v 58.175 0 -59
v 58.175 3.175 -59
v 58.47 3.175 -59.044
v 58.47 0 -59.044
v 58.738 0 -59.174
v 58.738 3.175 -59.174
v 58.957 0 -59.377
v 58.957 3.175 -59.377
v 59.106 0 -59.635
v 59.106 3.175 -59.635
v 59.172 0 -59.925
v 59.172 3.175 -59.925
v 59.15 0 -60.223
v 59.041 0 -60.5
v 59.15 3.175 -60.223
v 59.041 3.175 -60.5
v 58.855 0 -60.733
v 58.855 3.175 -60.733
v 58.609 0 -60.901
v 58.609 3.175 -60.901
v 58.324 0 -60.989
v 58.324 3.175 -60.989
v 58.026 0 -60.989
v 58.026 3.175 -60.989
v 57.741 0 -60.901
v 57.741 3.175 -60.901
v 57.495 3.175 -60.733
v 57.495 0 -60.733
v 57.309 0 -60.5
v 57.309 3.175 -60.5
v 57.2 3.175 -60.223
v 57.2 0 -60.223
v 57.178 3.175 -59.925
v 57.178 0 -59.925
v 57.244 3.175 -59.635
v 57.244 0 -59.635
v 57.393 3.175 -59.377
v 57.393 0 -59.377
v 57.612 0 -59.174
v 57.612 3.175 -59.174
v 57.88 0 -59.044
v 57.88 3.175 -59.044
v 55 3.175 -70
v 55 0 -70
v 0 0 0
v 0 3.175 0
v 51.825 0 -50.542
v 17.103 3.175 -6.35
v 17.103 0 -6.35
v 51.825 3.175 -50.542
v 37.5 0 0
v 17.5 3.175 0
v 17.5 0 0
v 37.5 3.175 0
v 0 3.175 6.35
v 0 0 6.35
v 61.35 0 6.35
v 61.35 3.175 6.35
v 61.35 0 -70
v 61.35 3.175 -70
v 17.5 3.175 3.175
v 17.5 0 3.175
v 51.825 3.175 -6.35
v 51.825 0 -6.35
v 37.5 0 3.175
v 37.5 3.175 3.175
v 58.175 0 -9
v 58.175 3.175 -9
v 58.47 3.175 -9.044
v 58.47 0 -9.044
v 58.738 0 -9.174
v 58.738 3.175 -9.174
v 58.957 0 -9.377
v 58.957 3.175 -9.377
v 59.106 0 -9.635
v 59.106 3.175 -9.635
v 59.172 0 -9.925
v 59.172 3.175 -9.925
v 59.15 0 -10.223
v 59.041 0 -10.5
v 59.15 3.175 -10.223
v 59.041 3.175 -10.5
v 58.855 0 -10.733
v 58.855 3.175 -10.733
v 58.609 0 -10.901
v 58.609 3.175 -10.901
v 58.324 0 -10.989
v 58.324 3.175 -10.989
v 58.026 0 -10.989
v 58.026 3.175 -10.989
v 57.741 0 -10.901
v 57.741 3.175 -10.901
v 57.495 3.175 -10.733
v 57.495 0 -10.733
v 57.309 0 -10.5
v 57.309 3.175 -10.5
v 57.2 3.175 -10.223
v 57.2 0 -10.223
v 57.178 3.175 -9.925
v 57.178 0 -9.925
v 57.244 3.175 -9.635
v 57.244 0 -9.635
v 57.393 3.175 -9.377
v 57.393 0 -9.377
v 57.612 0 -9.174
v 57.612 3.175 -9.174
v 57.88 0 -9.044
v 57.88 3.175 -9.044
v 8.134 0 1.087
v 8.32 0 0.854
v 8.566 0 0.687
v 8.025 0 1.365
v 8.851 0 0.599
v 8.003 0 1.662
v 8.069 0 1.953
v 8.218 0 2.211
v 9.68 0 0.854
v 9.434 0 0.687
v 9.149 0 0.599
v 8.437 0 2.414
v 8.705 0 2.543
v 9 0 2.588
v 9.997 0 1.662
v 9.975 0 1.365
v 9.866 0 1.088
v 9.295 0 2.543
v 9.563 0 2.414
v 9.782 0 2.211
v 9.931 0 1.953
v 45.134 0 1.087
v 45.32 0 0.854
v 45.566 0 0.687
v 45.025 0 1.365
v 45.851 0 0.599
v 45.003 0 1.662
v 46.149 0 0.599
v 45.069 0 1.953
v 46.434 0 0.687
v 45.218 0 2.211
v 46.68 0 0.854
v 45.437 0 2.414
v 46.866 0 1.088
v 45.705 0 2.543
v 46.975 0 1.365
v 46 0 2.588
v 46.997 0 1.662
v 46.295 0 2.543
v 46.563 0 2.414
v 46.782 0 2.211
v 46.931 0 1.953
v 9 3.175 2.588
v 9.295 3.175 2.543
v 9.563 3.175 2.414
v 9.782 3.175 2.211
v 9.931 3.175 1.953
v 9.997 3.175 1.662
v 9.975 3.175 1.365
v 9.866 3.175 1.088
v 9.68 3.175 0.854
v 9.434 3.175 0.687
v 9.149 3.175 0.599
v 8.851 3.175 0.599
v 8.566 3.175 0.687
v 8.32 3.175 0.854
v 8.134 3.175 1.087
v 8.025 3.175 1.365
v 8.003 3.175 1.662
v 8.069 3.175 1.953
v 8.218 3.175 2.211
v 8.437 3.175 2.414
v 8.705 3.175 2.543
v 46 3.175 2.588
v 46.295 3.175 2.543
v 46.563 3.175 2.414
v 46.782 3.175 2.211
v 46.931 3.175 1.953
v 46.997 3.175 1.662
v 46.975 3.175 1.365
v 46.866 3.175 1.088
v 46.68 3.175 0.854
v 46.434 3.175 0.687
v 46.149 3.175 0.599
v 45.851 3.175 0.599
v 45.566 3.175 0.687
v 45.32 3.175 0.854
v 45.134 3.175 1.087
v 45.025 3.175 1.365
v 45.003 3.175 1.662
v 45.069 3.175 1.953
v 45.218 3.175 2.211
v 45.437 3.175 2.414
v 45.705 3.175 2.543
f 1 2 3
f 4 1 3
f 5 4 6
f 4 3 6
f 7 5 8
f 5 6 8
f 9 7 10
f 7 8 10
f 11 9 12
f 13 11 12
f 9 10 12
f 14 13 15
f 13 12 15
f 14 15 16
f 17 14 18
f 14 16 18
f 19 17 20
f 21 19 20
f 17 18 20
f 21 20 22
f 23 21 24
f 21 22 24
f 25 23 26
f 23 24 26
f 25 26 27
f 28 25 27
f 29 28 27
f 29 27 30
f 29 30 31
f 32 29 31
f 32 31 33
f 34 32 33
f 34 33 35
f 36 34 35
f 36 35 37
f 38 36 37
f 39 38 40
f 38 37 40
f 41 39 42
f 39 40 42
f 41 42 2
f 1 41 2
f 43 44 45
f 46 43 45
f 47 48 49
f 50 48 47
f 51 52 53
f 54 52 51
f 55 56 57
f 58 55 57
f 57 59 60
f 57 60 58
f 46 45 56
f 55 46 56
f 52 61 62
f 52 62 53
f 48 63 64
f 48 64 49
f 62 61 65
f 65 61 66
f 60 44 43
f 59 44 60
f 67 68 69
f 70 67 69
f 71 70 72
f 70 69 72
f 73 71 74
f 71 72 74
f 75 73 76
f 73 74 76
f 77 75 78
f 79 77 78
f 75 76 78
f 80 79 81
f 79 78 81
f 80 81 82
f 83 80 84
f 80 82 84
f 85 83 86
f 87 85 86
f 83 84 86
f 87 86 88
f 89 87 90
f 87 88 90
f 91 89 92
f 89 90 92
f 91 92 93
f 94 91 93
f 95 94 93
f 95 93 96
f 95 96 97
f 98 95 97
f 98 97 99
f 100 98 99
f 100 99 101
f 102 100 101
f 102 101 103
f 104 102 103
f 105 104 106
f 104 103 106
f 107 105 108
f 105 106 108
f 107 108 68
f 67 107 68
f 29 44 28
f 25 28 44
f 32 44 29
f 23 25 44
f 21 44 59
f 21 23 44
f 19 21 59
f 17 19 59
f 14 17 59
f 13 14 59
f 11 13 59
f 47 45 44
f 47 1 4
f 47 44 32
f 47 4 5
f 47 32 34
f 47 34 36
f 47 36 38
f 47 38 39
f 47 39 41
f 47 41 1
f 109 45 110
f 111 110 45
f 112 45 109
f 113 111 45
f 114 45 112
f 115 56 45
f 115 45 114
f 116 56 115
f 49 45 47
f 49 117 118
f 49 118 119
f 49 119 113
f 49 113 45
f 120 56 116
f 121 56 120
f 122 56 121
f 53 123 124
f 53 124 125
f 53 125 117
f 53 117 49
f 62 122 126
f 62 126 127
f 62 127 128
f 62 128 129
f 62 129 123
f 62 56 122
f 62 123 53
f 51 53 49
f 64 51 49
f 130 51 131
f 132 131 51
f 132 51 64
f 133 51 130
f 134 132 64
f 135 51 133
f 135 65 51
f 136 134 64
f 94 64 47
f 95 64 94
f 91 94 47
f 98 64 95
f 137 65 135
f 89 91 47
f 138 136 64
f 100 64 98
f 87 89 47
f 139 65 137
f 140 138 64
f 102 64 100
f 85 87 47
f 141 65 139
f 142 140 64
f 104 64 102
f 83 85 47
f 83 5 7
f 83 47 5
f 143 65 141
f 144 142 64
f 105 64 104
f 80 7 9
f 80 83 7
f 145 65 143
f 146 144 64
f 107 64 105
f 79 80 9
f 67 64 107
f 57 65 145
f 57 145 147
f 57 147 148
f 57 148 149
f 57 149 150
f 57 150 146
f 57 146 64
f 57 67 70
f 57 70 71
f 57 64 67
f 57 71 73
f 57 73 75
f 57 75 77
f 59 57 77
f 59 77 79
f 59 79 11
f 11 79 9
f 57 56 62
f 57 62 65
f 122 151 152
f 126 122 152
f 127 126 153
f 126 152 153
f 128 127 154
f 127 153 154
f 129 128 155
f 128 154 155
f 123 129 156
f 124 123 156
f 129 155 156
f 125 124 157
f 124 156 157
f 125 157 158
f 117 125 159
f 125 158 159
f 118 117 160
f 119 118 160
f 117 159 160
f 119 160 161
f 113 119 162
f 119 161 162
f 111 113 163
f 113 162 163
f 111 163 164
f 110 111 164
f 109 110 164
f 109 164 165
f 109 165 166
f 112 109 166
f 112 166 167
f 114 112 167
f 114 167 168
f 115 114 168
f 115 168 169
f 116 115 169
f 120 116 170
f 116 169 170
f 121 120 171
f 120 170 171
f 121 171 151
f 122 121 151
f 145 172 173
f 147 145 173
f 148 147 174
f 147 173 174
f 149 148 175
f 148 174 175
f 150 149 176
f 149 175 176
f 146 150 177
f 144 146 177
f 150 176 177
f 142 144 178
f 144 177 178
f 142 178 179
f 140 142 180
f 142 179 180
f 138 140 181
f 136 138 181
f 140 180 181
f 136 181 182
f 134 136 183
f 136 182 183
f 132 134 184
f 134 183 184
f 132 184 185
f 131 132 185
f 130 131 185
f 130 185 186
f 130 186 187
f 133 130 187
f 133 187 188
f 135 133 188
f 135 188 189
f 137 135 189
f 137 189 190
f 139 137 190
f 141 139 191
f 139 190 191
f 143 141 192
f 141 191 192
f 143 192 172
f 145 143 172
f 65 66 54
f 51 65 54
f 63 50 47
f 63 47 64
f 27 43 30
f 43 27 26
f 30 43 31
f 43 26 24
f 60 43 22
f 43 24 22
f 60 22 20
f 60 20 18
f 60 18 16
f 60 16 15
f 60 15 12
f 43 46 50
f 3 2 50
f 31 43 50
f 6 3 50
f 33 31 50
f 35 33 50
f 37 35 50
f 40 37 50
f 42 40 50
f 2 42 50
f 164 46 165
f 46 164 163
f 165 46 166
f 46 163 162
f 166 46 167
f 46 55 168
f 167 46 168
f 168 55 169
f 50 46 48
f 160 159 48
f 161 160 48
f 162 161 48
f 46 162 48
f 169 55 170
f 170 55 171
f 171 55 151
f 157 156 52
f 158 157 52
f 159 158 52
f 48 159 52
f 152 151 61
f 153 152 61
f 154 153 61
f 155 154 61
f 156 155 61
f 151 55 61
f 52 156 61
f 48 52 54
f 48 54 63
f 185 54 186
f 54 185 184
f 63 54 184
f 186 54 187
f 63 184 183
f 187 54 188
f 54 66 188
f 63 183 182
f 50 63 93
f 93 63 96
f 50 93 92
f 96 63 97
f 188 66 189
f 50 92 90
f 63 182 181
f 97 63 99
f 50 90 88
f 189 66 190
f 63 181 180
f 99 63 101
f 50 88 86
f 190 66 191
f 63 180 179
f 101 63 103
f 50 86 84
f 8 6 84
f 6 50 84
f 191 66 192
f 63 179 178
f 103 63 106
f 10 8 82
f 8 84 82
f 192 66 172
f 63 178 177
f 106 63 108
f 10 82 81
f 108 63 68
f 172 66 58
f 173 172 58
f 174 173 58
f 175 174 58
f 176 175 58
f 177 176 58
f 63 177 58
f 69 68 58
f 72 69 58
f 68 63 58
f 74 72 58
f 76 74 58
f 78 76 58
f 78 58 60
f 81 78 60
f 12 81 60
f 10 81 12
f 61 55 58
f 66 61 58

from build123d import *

# Parameters (mm, degrees)
BOSS_EXTRUDE1_DEPTH = 3.175
SKETCH3_W           = 55
SKETCH3_H           = 6.35
BOSS_EXTRUDE3_DEPTH = 3.175
SKETCH5_W           = 6.35
SKETCH5_H           = 76.35
BOSS_EXTRUDE4_DEPTH = 3.175
SKETCH2_R           = 1
SKETCH2_W           = 20
SKETCH2_H           = 3.175
CUT_EXTRUDE1_DEPTH  = 3.175
CUT_EXTRUDE2_DEPTH  = 3.175


with BuildPart() as part:
    # Sketch1 → Boss-Extrude1 (new body)
    with BuildSketch(Plane(origin=(0, 0, 0), x_dir=(1, 0, 0), z_dir=(0, 1, 0))):
        Polygon((0, 0), (55, 0), (55, 70), align=None)
    extrude(amount=BOSS_EXTRUDE1_DEPTH)

    # Sketch3 → Boss-Extrude3 (add)
    with BuildSketch(Plane.XZ):
        with Locations((27.5, 3.175)):
            Rectangle(SKETCH3_W, SKETCH3_H)
    extrude(amount=-BOSS_EXTRUDE3_DEPTH)

    # Sketch5 → Boss-Extrude4 (add)
    with BuildSketch(Plane.XZ):
        with Locations((58.175, -31.825)):
            Rectangle(SKETCH5_W, SKETCH5_H)
    extrude(amount=-BOSS_EXTRUDE4_DEPTH)

    # Sketch2 → Cut-Extrude1 (cut)
    with BuildSketch(Plane(origin=(0, 3.175, 0), x_dir=(1, 0, 0), z_dir=(0, 1, 0))):
        with Locations(Location((9, -1.5875, 0), (0, 0, 270))):
            Circle(SKETCH2_R)
        with Locations(Location((46, -1.5875, 0), (0, 0, 270))):
            Circle(SKETCH2_R)
        with Locations(Location((58.175, 60, 0), (0, 0, 270))):
            Circle(SKETCH2_R)
        with Locations(Location((58.175, 10, 0), (0, 0, 270))):
            Circle(SKETCH2_R)
        with Locations((27.5, -1.5875)):
            Rectangle(SKETCH2_W, SKETCH2_H)
    extrude(amount=-CUT_EXTRUDE1_DEPTH, mode=Mode.SUBTRACT)

    # Sketch6 → Cut-Extrude2 (cut)
    with BuildSketch(Plane(origin=(0, 3.175, 0), x_dir=(1, 0, 0), z_dir=(0, 1, 0))):
        Polygon((51.825, 6.35), (17.102700256, 6.35), (51.825, 50.542017856), align=None)
    extrude(amount=-CUT_EXTRUDE2_DEPTH, mode=Mode.SUBTRACT)


solid = part.part
